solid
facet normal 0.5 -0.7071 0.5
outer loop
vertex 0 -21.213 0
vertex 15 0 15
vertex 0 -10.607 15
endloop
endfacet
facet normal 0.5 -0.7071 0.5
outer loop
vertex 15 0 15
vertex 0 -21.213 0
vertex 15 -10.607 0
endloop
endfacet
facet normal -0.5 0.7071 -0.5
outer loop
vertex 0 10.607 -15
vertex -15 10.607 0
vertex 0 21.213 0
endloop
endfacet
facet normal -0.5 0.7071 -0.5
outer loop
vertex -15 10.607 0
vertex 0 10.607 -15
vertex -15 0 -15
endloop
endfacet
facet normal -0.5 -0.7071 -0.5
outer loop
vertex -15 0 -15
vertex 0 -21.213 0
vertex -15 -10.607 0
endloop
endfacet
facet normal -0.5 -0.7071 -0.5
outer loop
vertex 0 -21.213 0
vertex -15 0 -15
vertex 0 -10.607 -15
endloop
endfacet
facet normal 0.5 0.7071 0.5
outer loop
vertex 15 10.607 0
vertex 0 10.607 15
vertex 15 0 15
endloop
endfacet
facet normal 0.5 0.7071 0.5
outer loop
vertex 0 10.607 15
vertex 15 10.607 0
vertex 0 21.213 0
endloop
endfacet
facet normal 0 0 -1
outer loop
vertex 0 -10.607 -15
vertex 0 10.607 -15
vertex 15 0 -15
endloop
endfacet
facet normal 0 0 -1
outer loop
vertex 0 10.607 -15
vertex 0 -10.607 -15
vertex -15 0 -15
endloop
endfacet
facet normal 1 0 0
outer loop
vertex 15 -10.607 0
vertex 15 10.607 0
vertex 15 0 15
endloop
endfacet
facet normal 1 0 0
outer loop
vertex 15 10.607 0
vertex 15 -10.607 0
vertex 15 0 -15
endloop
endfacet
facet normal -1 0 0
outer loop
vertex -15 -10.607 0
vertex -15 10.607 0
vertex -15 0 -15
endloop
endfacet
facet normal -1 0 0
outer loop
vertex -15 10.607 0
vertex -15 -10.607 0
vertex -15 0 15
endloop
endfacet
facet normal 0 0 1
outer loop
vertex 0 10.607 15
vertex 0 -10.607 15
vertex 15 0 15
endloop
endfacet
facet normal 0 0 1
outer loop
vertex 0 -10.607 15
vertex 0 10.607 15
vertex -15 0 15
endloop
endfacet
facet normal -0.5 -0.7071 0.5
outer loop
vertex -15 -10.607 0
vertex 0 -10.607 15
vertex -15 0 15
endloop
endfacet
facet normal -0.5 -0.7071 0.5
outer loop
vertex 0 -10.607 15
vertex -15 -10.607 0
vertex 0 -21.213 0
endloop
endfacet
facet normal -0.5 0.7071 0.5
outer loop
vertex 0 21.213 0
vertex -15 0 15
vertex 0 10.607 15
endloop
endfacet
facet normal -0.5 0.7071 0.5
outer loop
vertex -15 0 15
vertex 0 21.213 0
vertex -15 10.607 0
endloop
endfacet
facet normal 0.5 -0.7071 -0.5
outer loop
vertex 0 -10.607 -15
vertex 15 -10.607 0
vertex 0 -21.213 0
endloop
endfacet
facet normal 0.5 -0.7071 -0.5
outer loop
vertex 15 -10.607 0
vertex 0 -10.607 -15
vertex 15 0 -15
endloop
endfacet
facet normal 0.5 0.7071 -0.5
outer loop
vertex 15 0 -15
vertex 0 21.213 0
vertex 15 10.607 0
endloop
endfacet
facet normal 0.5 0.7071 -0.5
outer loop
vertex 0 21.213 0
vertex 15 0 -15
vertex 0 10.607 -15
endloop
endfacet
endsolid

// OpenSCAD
// Dodécaèdre Rhombique

sz=30;
sa=sz*1.5;

rotate([0,45])
dode_rhomb();

module dode_rhomb() {
    // take six rectangular solids and intersect them
    intersection() {
        rotate([45,0,0]) cube(size=[sa,sz,sz],center=true );
        rotate([-45,0,0]) cube(size=[sa,sz,sz],center=true );

        rotate([0,45,0]) cube(size=[sz,sa,sz],center=true );
        rotate([0,-45,0]) cube(size=[sz,sa,sz],center=true );

        rotate([0,0,45]) cube(size=[sz,sz,sa],center=true );
        rotate([0,0,-45]) cube(size=[sz,sz,sa],center=true );
    }
}
